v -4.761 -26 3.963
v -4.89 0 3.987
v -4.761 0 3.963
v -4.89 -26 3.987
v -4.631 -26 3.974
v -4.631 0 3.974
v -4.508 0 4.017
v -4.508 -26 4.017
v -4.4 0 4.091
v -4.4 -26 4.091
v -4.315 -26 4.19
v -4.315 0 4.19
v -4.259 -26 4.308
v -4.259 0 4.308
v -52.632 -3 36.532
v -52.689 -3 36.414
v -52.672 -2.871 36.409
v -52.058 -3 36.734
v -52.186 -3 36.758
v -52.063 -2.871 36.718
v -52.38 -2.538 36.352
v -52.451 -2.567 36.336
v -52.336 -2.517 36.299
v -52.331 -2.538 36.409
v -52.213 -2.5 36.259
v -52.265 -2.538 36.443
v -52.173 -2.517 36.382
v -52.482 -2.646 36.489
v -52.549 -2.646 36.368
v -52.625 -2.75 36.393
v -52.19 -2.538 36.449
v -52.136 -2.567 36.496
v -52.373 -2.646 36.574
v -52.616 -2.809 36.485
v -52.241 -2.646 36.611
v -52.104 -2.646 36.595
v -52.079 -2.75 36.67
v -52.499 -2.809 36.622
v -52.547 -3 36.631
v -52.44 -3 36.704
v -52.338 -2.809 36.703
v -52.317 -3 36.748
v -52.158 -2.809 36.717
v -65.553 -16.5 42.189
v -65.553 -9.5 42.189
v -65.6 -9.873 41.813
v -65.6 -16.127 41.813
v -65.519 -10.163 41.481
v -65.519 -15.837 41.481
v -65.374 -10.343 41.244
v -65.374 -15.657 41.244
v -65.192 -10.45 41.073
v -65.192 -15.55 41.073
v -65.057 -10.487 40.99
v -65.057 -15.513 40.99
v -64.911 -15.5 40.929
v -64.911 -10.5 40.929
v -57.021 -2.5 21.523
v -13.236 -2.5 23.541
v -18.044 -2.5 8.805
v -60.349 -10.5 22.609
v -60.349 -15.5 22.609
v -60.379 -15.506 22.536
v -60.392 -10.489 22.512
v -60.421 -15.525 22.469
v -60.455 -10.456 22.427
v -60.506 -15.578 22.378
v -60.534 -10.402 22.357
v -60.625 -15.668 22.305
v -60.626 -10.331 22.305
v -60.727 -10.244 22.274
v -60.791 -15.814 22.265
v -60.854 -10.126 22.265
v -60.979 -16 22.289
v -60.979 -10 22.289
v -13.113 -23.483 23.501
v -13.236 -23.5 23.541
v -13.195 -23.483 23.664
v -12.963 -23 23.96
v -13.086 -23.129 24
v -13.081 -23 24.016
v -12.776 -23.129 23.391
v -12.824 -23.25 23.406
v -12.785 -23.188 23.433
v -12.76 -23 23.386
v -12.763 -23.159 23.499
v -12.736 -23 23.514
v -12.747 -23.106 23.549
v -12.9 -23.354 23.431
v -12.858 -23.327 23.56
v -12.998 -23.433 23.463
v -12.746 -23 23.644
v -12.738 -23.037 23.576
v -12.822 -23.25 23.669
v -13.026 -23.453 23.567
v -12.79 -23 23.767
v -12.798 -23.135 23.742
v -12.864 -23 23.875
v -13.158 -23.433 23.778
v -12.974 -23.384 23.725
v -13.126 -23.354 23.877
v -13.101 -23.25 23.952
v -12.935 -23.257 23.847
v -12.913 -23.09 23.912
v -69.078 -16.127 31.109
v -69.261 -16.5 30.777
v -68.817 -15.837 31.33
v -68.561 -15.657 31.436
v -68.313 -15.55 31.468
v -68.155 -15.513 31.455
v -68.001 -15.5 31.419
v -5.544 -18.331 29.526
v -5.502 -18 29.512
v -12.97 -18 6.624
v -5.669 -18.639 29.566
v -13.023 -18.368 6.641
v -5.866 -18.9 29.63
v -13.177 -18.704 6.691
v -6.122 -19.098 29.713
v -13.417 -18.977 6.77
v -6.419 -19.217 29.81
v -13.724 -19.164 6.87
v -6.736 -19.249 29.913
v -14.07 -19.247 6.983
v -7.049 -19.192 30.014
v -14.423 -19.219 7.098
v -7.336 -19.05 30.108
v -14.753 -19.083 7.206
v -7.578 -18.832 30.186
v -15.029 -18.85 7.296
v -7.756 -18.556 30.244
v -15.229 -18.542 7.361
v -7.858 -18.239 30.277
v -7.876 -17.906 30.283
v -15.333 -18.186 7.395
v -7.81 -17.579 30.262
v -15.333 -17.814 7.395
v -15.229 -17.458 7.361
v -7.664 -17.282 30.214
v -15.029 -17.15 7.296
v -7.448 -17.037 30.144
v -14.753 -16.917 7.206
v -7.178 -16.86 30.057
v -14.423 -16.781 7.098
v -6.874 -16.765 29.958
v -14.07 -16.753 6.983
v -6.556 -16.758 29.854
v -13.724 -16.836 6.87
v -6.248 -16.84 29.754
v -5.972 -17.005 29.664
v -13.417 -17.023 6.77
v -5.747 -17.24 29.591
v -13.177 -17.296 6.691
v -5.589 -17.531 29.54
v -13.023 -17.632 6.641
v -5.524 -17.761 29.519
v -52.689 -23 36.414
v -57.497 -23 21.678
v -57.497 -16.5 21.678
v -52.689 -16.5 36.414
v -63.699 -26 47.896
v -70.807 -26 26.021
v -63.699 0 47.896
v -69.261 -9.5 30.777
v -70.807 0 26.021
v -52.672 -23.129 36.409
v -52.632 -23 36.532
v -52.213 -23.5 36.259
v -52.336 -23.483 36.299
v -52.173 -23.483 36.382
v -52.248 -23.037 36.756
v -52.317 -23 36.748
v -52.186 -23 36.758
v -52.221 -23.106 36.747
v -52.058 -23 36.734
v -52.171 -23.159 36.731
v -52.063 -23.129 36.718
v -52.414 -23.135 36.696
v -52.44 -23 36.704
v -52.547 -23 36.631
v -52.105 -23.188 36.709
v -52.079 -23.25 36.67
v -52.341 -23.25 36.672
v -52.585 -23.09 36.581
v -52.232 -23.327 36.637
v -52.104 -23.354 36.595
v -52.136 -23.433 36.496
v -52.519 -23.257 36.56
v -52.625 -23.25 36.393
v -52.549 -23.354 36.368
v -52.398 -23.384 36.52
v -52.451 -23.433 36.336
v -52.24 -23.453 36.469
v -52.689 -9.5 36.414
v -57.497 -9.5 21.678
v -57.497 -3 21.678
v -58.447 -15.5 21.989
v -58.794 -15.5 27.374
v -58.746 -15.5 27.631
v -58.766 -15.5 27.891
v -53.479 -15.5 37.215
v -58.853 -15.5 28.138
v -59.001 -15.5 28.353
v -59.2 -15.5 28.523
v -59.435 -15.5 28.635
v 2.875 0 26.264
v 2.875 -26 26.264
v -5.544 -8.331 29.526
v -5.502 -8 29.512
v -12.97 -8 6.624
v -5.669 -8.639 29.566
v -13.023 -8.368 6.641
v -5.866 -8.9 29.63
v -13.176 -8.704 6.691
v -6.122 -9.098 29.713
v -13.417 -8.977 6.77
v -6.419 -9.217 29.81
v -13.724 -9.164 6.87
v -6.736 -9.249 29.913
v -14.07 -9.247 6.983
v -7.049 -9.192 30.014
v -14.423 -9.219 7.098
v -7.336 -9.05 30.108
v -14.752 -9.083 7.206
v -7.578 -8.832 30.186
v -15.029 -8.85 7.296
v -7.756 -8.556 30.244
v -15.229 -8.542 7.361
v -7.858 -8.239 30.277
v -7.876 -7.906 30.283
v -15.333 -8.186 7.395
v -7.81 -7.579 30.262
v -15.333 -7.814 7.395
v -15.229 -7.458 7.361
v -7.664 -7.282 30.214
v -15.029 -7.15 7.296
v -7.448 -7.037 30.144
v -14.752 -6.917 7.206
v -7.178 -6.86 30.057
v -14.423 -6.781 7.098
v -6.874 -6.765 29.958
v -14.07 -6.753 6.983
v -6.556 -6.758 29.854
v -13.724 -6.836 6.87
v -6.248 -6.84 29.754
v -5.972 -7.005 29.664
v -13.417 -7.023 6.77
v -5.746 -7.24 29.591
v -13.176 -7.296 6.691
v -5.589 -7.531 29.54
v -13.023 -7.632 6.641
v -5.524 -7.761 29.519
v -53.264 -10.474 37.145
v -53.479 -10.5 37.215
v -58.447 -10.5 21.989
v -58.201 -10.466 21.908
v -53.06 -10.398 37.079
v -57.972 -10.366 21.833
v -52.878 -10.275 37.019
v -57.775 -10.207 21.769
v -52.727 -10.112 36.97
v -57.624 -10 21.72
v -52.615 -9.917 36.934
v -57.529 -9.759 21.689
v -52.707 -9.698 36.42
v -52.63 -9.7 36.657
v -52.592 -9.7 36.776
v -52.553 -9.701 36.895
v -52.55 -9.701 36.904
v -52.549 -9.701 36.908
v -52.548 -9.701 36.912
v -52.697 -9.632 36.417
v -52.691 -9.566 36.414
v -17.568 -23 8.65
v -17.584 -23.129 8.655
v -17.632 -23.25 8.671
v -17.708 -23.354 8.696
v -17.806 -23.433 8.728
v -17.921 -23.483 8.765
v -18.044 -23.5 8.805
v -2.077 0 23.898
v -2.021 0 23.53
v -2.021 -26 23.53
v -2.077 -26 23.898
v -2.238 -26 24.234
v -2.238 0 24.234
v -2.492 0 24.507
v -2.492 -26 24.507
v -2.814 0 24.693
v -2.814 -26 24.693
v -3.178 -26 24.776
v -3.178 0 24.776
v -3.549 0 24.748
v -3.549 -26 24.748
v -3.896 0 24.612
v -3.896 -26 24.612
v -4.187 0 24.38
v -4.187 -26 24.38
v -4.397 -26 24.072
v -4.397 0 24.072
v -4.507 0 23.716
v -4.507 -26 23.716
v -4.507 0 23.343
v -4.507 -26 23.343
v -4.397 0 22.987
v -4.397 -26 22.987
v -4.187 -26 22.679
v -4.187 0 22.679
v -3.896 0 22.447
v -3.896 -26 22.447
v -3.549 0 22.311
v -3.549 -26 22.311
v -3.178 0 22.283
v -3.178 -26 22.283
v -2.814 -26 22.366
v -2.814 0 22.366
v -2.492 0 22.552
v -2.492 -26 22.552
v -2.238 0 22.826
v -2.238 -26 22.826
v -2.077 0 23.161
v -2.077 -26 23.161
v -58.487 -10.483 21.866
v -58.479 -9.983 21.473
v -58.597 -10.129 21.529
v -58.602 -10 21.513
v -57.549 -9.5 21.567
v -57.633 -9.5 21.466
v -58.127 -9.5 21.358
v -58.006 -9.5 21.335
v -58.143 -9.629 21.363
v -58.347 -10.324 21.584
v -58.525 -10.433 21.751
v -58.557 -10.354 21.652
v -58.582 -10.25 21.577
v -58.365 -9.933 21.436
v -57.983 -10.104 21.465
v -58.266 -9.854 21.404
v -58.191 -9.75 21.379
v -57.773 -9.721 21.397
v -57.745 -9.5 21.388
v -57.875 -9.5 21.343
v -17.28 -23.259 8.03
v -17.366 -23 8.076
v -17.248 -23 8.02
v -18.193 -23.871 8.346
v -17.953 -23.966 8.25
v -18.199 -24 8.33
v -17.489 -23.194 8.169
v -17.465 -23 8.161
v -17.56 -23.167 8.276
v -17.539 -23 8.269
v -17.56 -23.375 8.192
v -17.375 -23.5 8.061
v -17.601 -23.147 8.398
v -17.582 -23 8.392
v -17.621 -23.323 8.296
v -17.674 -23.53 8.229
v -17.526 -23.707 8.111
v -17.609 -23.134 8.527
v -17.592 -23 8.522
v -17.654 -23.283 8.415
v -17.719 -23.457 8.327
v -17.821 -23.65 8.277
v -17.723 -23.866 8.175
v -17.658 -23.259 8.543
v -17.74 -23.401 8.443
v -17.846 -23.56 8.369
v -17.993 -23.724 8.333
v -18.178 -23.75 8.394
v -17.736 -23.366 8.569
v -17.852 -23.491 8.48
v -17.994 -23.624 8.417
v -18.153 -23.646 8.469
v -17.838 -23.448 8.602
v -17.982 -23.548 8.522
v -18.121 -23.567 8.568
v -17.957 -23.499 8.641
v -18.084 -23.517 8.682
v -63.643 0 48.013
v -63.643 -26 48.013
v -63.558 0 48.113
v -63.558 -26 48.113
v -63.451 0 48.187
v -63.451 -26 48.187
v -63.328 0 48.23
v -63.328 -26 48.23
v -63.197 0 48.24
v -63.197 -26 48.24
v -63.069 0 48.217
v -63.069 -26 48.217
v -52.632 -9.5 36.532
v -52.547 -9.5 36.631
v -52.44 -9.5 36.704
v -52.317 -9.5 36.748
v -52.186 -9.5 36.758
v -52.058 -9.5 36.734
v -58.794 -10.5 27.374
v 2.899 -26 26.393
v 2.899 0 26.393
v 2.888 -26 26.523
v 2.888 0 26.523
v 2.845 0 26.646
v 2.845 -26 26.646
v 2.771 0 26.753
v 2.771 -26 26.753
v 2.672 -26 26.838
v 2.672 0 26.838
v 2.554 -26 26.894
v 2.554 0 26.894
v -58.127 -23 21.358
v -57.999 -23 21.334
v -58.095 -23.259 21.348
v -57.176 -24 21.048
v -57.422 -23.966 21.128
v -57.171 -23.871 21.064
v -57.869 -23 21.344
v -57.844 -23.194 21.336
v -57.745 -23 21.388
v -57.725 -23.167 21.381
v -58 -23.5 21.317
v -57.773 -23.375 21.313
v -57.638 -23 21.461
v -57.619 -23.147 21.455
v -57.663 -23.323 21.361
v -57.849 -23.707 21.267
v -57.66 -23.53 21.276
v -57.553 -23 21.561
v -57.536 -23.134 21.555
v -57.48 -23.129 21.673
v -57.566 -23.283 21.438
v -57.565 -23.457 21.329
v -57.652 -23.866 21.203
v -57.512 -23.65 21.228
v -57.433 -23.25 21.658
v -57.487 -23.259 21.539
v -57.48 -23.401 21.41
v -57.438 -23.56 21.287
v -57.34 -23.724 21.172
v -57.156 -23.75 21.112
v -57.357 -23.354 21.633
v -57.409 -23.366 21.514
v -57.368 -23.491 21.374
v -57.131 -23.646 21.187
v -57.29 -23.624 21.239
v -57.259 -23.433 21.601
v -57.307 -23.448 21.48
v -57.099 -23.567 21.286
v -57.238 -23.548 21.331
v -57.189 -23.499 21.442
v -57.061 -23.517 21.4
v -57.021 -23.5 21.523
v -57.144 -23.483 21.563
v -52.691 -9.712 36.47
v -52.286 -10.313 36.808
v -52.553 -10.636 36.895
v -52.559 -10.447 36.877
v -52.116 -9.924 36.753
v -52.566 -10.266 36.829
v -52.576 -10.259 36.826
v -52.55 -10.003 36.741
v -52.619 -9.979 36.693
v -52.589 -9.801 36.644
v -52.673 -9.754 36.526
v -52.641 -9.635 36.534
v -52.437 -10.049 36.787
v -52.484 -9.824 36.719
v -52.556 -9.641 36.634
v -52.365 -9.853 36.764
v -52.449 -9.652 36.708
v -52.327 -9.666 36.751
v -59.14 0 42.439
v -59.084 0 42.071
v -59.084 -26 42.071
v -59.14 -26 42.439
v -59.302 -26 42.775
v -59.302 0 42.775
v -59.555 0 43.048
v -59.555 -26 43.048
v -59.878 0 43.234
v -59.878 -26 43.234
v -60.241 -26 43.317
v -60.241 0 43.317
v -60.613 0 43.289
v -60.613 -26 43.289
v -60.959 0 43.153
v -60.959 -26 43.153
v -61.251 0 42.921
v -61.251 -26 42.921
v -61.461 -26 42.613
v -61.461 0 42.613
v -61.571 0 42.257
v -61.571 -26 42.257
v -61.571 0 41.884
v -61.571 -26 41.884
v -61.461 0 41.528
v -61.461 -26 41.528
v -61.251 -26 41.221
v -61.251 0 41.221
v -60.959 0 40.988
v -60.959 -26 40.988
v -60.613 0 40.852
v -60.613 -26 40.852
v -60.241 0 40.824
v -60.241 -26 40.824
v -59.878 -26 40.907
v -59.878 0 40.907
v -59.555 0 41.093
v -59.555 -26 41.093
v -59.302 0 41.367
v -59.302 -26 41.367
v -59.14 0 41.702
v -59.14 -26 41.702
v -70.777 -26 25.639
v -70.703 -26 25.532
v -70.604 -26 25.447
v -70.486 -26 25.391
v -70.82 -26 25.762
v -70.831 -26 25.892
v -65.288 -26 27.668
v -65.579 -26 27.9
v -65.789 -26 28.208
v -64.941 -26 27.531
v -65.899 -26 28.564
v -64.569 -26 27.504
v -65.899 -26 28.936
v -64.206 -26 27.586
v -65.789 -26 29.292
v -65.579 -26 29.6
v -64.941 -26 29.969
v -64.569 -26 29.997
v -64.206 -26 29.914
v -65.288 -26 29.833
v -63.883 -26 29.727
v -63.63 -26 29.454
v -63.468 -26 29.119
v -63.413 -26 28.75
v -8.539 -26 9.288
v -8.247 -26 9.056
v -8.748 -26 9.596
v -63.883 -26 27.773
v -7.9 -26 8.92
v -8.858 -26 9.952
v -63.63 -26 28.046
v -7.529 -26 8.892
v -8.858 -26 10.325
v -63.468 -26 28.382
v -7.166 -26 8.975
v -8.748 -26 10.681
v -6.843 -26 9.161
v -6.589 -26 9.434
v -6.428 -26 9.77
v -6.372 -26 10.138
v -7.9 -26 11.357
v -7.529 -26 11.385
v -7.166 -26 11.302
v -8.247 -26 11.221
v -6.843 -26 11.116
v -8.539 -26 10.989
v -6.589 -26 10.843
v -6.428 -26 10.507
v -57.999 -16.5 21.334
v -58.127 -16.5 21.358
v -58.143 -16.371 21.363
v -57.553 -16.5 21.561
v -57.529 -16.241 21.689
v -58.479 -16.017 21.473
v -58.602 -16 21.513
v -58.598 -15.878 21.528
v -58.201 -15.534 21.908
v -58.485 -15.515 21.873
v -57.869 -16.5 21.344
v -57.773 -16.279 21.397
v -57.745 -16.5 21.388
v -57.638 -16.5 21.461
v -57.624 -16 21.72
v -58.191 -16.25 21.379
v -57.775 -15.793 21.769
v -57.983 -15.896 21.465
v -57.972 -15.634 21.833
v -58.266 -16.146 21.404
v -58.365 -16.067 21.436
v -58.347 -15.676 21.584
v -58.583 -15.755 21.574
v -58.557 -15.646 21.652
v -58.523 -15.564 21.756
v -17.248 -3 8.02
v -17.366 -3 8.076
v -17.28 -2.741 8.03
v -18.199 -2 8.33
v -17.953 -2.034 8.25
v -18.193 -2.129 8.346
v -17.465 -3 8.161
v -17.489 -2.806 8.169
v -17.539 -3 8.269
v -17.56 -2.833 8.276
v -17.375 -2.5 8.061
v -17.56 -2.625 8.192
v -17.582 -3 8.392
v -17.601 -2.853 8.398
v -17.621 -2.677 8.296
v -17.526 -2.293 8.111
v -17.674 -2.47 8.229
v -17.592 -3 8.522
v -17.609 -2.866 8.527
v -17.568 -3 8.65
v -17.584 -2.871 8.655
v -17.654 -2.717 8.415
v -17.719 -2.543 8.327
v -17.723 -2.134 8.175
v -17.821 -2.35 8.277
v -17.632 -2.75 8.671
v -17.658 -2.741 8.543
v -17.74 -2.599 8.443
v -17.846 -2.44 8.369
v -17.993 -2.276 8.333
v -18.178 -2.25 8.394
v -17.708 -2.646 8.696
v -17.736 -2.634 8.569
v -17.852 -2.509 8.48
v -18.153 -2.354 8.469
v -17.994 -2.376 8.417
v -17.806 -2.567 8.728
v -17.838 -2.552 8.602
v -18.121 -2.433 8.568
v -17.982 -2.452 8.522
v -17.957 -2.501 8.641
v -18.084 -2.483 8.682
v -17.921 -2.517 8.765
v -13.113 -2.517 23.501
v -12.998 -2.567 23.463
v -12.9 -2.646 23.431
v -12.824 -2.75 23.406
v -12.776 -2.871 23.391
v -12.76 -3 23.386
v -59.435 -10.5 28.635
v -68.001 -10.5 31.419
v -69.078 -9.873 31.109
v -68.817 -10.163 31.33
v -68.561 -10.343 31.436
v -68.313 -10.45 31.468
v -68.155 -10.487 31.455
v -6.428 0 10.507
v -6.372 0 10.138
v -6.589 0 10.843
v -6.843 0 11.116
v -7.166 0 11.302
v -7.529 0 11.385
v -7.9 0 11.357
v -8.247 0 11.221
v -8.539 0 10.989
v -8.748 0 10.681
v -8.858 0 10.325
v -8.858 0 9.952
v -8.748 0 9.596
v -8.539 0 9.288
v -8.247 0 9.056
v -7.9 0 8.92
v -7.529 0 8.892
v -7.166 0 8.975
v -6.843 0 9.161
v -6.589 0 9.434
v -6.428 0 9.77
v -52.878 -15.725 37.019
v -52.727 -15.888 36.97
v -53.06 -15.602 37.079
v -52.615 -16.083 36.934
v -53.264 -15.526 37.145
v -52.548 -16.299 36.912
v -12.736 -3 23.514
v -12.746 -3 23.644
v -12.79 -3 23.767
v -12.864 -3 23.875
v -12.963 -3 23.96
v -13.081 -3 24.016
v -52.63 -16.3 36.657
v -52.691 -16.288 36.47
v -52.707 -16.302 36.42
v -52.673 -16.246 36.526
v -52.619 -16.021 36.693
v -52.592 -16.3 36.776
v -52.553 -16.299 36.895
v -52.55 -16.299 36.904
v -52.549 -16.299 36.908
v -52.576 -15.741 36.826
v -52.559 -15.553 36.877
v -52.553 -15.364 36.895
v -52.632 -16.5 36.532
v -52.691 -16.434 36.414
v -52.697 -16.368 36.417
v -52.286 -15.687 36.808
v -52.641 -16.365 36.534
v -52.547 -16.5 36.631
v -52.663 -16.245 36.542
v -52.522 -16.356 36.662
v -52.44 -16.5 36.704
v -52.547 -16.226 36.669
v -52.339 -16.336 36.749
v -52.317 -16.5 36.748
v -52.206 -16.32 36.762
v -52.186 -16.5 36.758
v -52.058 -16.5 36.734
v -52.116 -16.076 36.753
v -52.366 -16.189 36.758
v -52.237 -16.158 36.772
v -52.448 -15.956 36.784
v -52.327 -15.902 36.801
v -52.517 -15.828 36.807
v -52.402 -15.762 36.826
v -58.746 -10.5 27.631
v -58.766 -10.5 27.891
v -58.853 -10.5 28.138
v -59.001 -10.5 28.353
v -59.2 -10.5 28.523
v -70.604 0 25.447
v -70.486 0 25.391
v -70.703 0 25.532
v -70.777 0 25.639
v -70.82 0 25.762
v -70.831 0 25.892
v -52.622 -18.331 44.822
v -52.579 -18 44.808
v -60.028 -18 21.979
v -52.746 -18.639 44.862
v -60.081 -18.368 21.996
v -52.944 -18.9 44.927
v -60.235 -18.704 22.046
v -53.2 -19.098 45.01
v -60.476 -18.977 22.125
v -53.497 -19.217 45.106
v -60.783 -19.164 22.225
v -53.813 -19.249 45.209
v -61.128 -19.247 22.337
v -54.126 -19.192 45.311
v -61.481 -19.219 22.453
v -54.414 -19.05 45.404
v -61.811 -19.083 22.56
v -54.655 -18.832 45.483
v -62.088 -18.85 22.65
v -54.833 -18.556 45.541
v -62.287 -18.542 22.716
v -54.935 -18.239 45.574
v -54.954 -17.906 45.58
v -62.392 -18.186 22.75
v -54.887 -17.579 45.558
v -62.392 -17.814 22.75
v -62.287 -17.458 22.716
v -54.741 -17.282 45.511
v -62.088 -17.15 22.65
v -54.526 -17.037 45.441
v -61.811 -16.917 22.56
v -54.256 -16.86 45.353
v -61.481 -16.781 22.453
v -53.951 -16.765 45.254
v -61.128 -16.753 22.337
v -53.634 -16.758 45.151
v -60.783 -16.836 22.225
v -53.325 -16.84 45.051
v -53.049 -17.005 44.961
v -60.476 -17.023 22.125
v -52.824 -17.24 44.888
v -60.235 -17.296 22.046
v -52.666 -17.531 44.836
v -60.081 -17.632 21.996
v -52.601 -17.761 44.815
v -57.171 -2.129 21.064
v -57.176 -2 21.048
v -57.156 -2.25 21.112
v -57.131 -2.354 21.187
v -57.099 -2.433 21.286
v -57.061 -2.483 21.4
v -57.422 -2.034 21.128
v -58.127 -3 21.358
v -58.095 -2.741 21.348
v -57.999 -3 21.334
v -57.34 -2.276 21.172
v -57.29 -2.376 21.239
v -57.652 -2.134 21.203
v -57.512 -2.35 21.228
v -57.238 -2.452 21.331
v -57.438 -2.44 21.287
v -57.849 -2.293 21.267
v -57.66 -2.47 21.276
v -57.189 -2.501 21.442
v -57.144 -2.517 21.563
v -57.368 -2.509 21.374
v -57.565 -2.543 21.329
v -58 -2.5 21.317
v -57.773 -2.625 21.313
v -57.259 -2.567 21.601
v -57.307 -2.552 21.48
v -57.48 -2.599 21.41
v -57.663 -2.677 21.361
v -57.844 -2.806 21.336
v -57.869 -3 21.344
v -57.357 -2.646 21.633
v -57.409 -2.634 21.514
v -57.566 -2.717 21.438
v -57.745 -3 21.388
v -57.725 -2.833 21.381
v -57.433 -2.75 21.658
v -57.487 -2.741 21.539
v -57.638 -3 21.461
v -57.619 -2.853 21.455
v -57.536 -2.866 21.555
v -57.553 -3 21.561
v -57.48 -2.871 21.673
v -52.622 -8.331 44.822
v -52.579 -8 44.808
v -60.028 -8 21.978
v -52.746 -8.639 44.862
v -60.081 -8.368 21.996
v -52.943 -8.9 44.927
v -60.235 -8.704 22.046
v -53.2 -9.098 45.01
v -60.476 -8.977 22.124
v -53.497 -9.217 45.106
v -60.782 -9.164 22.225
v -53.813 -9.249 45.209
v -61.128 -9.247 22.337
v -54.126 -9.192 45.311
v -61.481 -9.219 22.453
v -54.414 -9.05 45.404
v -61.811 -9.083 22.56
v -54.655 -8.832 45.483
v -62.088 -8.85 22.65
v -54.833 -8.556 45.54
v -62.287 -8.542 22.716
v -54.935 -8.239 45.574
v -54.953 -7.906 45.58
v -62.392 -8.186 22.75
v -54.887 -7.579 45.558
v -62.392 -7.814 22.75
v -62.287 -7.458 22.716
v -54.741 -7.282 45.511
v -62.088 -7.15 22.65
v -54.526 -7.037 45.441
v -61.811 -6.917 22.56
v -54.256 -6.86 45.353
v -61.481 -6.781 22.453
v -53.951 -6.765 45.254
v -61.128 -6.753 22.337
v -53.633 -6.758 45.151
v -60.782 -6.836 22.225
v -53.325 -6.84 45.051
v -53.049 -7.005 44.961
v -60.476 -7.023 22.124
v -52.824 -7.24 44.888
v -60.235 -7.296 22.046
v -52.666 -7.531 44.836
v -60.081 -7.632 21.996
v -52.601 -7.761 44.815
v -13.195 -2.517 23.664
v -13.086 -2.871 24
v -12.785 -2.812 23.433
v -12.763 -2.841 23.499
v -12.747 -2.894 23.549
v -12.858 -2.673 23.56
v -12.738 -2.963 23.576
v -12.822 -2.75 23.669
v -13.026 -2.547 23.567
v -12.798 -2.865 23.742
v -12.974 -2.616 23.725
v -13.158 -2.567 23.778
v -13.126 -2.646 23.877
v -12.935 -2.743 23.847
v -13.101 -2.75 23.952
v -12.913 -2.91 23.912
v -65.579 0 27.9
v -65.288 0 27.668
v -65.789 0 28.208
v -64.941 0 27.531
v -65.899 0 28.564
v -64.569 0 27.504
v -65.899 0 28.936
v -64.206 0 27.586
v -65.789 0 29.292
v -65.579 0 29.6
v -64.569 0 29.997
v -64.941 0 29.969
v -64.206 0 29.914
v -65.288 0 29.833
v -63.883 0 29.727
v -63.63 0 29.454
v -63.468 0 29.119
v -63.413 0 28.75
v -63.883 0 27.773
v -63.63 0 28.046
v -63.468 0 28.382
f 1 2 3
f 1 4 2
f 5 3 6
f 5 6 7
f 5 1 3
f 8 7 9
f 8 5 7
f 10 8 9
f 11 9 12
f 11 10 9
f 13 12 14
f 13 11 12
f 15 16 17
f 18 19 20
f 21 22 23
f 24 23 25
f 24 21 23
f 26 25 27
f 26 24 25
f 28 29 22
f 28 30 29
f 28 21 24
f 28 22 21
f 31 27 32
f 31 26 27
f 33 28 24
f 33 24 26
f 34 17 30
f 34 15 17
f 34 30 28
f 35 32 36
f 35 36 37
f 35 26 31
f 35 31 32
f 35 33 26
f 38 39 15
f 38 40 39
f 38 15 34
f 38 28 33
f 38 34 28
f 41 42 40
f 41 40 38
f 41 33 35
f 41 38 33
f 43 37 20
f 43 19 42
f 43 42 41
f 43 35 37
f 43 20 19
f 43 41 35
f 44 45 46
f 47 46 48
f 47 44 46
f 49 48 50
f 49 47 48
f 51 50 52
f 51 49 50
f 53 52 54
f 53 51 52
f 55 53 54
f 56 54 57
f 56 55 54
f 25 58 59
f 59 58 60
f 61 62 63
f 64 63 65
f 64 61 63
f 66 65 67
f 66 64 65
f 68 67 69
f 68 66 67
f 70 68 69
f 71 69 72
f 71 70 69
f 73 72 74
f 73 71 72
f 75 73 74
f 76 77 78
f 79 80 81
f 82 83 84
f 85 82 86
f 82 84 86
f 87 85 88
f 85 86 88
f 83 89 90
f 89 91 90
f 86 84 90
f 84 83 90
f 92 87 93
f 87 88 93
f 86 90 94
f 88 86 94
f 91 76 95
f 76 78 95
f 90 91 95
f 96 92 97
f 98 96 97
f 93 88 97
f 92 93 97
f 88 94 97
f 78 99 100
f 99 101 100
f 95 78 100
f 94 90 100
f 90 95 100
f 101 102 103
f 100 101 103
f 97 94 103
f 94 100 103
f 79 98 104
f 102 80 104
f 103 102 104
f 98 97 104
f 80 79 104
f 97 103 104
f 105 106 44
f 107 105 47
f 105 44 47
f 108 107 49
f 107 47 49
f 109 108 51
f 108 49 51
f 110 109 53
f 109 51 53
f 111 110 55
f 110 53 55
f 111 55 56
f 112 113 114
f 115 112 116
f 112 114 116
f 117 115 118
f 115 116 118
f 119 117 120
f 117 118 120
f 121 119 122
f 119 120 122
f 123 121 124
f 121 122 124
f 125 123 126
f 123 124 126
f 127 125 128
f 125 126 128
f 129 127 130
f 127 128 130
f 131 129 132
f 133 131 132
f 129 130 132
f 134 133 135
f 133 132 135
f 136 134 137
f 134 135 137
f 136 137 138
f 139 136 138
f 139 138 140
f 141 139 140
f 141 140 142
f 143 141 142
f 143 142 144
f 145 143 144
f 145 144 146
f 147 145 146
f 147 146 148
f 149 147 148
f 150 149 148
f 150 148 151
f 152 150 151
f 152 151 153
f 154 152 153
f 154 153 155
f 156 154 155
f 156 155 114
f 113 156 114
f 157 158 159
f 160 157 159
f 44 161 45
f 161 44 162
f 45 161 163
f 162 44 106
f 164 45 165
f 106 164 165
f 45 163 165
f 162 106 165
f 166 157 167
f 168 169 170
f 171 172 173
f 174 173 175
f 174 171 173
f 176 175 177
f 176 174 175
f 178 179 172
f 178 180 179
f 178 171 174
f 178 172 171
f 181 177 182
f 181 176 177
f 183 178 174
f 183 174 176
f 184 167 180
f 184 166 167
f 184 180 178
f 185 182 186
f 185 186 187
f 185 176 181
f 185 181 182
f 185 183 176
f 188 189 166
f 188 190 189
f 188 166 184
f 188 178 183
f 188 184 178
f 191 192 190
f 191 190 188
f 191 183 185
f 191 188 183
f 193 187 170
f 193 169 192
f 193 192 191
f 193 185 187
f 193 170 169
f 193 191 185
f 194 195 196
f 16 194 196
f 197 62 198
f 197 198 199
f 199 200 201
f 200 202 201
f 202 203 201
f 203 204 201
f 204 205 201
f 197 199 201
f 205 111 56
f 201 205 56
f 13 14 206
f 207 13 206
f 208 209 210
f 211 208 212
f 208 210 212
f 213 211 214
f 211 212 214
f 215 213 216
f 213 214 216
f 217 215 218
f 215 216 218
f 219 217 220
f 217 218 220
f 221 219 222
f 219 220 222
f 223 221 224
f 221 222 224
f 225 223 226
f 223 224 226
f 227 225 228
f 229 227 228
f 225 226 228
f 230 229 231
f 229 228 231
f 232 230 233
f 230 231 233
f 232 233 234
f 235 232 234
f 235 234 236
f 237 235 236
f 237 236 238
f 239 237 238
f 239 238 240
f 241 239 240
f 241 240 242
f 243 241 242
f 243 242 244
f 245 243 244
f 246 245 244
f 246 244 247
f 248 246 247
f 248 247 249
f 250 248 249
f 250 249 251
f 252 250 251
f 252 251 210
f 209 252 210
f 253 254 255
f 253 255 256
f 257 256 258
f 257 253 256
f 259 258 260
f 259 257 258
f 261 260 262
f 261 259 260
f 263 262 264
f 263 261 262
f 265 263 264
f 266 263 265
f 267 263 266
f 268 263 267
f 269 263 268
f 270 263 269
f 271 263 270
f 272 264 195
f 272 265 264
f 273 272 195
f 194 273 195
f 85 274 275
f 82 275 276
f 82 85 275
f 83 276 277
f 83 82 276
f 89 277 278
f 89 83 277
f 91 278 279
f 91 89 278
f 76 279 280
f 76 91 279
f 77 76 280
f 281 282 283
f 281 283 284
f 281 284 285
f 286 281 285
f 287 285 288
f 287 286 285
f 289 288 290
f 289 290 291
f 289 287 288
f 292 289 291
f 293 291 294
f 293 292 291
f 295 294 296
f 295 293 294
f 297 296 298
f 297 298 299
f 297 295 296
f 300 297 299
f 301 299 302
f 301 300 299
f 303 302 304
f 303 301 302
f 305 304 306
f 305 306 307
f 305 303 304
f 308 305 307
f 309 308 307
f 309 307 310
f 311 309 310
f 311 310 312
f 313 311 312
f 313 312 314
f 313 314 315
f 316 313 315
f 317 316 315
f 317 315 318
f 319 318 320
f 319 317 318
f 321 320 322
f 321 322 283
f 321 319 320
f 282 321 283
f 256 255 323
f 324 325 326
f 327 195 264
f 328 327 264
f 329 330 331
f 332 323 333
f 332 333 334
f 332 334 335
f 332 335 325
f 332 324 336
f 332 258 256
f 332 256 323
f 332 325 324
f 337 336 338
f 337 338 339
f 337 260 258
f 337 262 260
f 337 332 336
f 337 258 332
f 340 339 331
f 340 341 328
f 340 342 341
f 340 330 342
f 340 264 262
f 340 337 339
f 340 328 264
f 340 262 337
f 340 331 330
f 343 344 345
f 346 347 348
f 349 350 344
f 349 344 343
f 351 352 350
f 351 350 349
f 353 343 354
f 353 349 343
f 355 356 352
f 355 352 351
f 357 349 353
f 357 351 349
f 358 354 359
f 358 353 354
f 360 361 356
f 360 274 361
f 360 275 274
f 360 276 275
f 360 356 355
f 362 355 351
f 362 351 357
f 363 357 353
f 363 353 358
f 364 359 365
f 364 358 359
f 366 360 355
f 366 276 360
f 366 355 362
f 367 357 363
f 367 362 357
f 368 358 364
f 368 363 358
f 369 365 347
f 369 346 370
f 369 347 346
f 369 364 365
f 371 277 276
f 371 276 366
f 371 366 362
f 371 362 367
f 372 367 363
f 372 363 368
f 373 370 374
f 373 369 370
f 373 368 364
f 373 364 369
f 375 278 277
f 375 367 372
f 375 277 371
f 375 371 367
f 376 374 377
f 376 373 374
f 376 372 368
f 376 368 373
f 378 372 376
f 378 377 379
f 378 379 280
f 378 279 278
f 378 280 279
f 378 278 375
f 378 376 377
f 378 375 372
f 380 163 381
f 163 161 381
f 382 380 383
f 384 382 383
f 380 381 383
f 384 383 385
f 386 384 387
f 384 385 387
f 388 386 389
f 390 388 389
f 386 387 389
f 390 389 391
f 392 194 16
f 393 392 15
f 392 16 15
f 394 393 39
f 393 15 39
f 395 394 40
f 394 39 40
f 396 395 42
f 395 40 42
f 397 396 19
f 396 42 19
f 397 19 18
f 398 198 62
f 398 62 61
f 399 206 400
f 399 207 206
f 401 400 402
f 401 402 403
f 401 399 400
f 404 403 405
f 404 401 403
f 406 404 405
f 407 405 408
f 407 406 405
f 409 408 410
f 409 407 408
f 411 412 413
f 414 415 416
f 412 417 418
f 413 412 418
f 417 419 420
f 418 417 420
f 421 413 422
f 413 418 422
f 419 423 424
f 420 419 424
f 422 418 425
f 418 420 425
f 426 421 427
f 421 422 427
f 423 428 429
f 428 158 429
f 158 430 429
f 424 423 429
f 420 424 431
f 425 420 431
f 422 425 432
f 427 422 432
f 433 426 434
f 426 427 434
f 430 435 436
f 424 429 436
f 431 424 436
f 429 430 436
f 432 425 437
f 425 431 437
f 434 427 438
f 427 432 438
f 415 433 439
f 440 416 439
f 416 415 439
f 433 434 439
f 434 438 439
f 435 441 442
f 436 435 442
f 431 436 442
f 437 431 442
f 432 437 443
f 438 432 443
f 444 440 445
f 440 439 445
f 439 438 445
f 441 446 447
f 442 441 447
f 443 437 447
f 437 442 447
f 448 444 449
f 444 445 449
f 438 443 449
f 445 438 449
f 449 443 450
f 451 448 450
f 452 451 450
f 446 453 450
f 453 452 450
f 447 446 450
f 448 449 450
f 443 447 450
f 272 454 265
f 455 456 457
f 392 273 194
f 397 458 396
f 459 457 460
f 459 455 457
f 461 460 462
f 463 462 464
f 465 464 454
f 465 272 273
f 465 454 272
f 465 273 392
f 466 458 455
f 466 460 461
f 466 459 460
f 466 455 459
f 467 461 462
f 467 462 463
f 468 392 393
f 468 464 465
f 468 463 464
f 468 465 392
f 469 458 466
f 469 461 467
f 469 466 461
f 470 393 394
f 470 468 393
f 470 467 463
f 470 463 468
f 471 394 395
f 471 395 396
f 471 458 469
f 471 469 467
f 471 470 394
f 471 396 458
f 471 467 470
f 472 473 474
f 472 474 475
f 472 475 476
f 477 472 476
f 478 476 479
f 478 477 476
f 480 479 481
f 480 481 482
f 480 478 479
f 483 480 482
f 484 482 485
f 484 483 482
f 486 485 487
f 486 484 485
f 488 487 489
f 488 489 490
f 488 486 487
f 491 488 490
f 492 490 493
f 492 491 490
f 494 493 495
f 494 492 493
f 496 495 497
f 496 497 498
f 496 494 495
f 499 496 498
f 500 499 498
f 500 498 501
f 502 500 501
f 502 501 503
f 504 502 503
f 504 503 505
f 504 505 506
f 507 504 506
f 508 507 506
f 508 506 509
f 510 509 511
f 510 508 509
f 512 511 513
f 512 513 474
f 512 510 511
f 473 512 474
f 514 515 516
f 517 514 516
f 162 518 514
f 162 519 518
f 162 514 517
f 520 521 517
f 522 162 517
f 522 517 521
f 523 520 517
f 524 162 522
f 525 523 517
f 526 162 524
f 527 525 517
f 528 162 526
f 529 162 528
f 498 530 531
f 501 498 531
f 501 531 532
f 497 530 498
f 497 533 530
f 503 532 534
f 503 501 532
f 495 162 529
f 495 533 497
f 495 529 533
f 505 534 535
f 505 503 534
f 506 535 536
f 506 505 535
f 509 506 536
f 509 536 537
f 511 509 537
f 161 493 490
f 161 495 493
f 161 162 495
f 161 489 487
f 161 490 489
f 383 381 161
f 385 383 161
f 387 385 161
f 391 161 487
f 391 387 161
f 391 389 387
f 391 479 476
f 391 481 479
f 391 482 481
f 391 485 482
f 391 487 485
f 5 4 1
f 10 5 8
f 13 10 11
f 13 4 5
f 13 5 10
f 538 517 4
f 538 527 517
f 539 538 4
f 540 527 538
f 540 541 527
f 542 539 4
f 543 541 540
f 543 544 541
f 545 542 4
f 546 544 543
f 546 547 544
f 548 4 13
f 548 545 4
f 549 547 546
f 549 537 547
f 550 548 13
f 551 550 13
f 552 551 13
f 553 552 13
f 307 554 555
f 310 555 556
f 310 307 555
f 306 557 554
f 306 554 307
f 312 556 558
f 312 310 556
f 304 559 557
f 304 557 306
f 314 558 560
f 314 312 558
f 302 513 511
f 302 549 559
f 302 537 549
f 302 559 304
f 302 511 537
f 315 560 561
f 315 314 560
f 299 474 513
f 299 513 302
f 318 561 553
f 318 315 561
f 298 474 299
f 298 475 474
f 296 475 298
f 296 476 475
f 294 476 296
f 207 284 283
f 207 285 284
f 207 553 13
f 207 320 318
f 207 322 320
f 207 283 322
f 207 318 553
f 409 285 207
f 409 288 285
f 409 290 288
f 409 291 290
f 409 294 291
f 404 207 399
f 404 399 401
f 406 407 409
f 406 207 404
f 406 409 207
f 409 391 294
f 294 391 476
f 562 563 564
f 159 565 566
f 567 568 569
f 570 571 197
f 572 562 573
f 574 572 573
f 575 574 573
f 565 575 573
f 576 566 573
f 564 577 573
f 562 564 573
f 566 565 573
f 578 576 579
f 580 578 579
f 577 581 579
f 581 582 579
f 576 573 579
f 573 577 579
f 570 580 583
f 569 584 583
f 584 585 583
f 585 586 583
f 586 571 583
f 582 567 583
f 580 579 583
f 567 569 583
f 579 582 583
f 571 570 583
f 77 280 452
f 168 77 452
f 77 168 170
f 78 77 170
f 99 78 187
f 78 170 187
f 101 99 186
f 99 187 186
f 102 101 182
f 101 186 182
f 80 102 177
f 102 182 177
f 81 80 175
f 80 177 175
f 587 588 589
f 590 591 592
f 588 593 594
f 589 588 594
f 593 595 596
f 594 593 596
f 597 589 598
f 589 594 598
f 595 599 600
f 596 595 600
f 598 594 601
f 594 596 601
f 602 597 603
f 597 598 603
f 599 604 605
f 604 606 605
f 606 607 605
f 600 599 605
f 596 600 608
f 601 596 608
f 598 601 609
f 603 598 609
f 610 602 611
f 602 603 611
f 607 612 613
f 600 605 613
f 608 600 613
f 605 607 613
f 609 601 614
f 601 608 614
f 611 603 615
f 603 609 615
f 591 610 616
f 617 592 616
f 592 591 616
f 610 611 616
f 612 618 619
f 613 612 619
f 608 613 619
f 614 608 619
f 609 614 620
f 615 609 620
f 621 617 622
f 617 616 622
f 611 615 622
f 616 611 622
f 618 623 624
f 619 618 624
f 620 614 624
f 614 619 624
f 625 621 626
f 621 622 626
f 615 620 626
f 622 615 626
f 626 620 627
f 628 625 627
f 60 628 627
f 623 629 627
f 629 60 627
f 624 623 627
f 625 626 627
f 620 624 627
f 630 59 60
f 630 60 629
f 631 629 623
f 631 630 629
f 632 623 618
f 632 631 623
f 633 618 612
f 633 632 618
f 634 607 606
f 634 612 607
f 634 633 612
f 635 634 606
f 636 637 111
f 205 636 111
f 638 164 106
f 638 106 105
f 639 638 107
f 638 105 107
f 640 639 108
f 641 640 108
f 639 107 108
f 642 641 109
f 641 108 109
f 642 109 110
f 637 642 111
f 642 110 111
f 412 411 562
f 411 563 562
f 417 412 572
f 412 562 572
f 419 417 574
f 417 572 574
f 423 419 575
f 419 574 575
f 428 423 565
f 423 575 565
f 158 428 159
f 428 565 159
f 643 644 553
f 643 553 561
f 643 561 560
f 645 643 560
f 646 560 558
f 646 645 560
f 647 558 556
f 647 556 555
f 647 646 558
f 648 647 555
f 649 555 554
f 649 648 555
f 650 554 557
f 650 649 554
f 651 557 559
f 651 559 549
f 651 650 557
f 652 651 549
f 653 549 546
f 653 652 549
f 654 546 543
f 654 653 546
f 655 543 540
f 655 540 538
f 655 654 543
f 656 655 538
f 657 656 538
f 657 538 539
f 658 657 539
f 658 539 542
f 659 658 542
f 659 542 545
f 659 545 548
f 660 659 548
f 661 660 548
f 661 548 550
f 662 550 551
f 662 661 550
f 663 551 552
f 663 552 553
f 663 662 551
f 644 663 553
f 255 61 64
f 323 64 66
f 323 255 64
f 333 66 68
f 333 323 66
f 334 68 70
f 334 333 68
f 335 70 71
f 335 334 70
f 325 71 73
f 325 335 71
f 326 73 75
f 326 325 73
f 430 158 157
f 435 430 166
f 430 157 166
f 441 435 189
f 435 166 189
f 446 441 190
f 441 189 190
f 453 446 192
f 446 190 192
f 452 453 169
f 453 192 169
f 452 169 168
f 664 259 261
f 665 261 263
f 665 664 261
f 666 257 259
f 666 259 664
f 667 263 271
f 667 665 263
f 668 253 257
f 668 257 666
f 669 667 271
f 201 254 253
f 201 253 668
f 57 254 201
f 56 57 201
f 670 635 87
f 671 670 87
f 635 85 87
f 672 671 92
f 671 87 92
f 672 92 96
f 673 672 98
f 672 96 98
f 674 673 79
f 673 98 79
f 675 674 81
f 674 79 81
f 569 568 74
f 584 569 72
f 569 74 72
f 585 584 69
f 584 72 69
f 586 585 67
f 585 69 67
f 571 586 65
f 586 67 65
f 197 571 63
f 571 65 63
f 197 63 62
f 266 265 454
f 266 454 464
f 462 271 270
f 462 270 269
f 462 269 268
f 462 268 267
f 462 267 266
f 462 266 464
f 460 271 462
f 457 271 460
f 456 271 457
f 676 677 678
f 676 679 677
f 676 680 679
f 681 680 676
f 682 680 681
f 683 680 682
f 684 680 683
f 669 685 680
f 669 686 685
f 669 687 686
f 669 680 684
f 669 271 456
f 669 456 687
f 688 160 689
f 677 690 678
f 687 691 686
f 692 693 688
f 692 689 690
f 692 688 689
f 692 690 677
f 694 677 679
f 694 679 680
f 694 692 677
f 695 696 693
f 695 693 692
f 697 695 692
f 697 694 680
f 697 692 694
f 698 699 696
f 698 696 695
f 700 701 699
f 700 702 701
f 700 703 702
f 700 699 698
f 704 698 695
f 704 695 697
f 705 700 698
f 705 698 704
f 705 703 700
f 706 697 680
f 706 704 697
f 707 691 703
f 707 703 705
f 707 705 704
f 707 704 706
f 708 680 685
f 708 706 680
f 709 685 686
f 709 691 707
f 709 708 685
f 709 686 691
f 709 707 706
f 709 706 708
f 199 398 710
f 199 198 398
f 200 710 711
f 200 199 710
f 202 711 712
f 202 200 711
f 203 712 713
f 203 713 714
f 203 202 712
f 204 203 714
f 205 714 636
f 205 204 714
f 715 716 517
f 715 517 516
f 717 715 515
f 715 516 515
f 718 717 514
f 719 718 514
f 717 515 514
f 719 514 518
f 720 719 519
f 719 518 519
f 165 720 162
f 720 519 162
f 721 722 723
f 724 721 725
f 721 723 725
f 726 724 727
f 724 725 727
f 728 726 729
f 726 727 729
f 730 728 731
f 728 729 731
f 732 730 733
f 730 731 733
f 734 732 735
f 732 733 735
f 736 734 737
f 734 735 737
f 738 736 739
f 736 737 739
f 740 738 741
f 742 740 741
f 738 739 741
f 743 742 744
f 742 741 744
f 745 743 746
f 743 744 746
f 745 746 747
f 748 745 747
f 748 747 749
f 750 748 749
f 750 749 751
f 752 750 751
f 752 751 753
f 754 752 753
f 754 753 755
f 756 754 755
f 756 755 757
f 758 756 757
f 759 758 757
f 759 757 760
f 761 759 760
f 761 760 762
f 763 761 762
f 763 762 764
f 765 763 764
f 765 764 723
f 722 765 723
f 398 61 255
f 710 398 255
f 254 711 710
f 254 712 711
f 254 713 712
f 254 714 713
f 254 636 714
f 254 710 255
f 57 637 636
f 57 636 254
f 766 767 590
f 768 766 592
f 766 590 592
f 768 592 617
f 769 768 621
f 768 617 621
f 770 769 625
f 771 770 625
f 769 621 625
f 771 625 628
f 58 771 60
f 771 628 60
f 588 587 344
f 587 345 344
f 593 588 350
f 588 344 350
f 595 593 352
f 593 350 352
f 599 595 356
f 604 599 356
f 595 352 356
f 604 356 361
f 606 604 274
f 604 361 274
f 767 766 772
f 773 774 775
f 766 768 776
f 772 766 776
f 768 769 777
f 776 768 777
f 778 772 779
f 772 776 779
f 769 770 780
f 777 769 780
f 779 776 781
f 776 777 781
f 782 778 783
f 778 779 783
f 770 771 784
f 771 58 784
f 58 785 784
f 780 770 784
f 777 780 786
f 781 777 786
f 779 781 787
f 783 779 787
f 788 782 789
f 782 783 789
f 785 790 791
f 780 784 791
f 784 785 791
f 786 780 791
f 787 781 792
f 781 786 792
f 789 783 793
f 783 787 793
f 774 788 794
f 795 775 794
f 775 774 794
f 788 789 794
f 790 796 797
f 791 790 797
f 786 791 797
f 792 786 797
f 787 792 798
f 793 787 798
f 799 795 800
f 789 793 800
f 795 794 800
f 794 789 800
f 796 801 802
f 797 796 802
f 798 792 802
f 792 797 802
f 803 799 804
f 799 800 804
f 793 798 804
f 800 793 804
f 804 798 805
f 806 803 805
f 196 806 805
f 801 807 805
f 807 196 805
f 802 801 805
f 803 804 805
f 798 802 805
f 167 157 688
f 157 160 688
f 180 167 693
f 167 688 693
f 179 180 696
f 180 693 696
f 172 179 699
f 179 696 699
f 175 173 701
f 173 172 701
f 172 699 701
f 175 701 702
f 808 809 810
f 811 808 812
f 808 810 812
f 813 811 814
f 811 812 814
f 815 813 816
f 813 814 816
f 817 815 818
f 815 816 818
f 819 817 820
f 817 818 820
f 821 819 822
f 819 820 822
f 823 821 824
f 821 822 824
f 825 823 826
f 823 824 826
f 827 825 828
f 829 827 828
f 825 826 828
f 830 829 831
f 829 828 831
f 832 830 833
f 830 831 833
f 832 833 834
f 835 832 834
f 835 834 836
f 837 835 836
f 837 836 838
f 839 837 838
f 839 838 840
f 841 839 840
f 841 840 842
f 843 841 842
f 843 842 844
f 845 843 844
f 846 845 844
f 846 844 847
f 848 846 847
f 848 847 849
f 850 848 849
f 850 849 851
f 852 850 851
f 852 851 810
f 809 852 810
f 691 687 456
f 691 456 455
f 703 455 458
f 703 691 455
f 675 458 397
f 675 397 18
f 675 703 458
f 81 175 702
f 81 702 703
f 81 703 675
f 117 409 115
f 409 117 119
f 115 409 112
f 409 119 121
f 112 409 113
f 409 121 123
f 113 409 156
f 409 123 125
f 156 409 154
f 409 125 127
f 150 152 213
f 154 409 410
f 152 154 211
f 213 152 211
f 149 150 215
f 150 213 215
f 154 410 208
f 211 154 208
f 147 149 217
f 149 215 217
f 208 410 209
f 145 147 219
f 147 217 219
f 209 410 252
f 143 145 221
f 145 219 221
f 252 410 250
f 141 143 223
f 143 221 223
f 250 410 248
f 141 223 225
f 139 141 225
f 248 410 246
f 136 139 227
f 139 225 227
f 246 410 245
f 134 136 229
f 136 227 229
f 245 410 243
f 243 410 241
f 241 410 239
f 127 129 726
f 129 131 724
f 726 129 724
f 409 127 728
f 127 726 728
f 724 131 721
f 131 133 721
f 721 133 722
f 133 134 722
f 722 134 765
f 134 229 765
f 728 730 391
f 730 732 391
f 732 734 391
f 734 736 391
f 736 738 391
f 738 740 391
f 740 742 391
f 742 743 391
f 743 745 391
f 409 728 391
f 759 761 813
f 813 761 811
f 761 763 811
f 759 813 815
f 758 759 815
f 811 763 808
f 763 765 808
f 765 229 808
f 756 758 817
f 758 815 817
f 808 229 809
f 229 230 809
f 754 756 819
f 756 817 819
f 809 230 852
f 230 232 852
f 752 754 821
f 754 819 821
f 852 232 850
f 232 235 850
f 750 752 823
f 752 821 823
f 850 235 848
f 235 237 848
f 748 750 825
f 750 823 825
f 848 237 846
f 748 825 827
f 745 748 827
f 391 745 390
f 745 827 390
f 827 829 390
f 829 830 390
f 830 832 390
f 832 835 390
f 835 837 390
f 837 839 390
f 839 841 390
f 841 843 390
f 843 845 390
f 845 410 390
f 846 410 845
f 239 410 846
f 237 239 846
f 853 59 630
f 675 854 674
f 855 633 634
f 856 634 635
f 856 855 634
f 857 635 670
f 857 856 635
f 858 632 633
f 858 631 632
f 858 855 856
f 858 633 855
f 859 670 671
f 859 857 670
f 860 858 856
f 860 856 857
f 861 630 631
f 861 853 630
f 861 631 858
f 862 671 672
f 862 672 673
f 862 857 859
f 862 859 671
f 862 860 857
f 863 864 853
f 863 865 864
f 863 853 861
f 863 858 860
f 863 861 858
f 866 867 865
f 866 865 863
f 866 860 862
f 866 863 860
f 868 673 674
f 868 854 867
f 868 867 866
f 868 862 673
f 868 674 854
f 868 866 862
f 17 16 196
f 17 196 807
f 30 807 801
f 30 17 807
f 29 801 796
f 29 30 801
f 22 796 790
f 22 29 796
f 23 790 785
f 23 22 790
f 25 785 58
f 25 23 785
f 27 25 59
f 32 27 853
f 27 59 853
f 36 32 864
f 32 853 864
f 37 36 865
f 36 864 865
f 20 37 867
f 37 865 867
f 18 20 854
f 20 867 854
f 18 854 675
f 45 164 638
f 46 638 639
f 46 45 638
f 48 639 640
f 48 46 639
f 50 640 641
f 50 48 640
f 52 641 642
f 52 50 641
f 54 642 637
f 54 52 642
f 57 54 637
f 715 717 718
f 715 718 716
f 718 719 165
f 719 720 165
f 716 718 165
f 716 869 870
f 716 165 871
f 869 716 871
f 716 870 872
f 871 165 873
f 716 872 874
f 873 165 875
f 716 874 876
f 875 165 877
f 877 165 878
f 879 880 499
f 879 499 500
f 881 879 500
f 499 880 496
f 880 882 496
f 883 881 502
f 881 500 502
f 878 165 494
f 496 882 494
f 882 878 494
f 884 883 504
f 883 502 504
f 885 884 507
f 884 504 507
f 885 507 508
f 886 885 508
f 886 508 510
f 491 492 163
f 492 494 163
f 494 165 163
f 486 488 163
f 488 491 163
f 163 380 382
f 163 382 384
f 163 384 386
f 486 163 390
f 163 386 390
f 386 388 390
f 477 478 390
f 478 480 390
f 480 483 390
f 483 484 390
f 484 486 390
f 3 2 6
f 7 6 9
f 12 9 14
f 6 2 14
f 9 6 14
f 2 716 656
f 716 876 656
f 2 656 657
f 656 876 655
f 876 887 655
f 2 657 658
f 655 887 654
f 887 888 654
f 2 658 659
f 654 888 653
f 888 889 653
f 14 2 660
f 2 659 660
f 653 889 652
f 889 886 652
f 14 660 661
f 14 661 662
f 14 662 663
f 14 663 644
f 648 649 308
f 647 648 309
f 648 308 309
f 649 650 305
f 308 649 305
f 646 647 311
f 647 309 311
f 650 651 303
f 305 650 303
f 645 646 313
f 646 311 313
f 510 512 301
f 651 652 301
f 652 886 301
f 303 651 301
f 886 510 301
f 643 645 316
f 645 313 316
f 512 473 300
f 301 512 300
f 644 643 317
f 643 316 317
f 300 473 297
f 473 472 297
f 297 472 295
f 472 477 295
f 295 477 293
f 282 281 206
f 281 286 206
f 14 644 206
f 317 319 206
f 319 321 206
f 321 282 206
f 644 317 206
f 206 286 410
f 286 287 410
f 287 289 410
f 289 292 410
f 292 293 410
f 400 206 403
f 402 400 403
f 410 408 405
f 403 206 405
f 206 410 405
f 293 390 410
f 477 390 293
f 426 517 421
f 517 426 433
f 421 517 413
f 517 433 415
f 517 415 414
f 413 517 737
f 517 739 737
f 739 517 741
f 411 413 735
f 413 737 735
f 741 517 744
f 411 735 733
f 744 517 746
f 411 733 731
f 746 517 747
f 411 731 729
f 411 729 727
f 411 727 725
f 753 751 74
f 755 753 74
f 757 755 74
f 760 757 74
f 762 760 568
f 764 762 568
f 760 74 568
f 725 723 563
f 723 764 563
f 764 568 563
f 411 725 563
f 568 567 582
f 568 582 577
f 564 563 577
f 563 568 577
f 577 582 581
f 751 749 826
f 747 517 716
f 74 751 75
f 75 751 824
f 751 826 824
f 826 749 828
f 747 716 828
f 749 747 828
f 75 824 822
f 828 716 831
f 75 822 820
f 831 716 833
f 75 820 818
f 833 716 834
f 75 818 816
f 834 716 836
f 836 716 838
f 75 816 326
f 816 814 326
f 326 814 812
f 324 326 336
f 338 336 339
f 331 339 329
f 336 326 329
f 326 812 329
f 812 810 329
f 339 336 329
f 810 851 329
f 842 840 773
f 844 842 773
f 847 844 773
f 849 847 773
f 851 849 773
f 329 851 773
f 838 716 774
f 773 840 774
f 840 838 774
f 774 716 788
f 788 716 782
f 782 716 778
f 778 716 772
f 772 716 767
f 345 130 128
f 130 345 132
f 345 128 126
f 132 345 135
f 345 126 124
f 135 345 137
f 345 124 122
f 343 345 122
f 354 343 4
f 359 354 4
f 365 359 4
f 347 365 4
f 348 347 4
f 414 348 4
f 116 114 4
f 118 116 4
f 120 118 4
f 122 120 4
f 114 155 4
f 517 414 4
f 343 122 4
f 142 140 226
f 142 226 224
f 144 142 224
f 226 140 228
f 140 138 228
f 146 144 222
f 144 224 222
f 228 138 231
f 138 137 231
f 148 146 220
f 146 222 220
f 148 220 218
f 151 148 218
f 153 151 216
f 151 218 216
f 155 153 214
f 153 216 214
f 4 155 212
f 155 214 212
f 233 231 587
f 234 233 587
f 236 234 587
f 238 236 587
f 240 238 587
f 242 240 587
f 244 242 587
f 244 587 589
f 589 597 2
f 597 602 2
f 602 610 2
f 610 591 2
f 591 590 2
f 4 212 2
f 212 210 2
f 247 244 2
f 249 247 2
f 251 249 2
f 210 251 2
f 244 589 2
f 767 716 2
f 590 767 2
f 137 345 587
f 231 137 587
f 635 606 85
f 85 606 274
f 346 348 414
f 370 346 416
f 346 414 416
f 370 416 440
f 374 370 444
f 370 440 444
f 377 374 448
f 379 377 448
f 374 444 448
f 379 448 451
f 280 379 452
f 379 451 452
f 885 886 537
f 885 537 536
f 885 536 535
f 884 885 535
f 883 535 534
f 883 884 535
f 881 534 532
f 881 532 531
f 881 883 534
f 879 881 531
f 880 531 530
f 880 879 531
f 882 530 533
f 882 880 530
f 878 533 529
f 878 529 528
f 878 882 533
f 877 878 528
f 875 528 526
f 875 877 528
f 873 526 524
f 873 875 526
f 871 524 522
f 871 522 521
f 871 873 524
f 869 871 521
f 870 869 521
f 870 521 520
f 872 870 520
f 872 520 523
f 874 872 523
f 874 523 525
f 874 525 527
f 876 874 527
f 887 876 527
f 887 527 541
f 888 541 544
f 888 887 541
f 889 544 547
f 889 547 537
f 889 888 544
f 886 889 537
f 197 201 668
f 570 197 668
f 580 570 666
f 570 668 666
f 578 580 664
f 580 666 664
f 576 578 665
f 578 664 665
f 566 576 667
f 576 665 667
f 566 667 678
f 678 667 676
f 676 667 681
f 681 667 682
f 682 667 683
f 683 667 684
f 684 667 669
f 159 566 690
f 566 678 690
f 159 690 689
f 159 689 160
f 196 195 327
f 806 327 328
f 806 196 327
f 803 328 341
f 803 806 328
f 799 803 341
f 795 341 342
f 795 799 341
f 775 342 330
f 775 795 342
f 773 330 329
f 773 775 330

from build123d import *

# Parameters (mm, degrees)
F0_R     = 1.25
F1_DEPTH = 26
F2_R     = 1.25
F3_DEPTH = 25
F4_DEPTH = 16.5
F5_W     = 5
F5_H     = 10
F6_DEPTH = 14
F7_R     = 1
F8_R     = 0.5


with BuildPart() as f1:
    # F0 (on Front) → F1 (new body)
    with BuildSketch(Plane.XZ):
        Polygon((-63.544681223, 48.3711008589), (-70.961089088, 25.5457444679), (-4.4139098395, 3.8321440613), (3.0292749177, 26.7399112527), align=None)
        with Locations((-7.6221936302, 10.1384017438)):
            Circle(F0_R, mode=Mode.SUBTRACT)
        with Locations((-3.2710926357, 23.5297136431)):
            Circle(F0_R, mode=Mode.SUBTRACT)
        with Locations((-64.662632986, 28.7500592351)):
            Circle(F0_R, mode=Mode.SUBTRACT)
        with Locations((-60.3344836134, 42.0707333056)):
            Circle(F0_R, mode=Mode.SUBTRACT)
    extrude(amount=F1_DEPTH)

    # F2 (on face) → F3 (cut)
    with BuildSketch(Plane(origin=(0.7053652428, 0, 2.1617818497), x_dir=(0.9506732609, 0, -0.3101940539), z_dir=(-0.3101940539, 0, -0.9506732609))):
        with Locations((-65.1349479941, 18)):
            Circle(F2_R)
        with Locations((-65.1348943617, 8)):
            Circle(F2_R)
        with Locations((-15.6349479941, 18)):
            Circle(F2_R)
        with Locations((-15.6348943617, 8)):
            Circle(F2_R)
    extrude(amount=-F3_DEPTH, mode=Mode.SUBTRACT)

    # F2 (on face) → F4 (cut)
    with BuildSketch(Plane(origin=(0.7053652428, 0, 2.1617818497), x_dir=(0.9506732609, 0, -0.3101940539), z_dir=(-0.3101940539, 0, -0.9506732609))):
        Polygon((-19.3849479941, 23.5), (-61.3849479941, 23.5), (-61.3849479941, 15.5), (-64.3849479941, 15.5), (-64.3849479941, 10.5), (-61.3849479941, 10.5), (-61.3849479941, 2.5), (-19.3849479941, 2.5), align=None)
    extrude(amount=-F4_DEPTH, mode=Mode.SUBTRACT)

    # F5 (on face) → F6 (cut)
    with BuildSketch(Plane(origin=(-71.6926139783, 0, 23.294342356), x_dir=(0, -1, 0), z_dir=(-0.9510565163, 0, 0.3090169944))):
        with Locations((13, 13.8672642722)):
            Rectangle(F5_W, F5_H)
    extrude(amount=-F6_DEPTH, mode=Mode.SUBTRACT)

    # F7 (call 1 of 4: OpenCascade refuses the feature's edges together)
    f7_edges = [f1.edges().sort_by_distance(p)[0] for p in [
        (-67.407394, -10.5, 36.482894),
        (-67.407394, -15.5, 36.482894),
        (-65.862309, -13, 41.238177),
        (-68.952479, -13, 31.727612),
    ]]
    fillet(f7_edges, radius=F7_R)

    # F7#2 (call 2 of 4)
    f7_2_edges = [f1.edges().sort_by_distance(p)[0] for p in [
        (-55.092562, -15.5, 29.046082),
    ]]
    fillet(f7_2_edges, radius=F7_R)

    # F7#3 (call 3 of 4)
    f7_3_edges = [f1.edges().sort_by_distance(p)[0] for p in [
        (-55.092562, -10.5, 29.046082),
    ]]
    fillet(f7_3_edges, radius=F7_R)

    # F7#4 (call 4 of 4)
    f7_4_edges = [f1.edges().sort_by_distance(p)[0] for p in [
        (-58.483196, -13, 28.325936),
    ]]
    fillet(f7_4_edges, radius=F7_R)

    # F8
    f8_edges = [f1.edges().sort_by_distance(p)[0] for p in [
        (-57.651663, -20, 21.203028),
        (-60.503683, -13, 22.13361),
        (-59.55301, -10.5, 21.823416),
        (-57.930109, -10.207107, 21.293881),
        (-37.687525, -23.5, 14.688953),
        (-55.092562, -23.5, 29.046082),
        (-52.533462, -20, 36.889137),
        (-32.569323, -23.5, 30.375061),
        (-52.533462, -6, 36.889137),
        (-55.092562, -2.5, 29.046082),
        (-32.569323, -2.5, 30.375061),
        (-37.687525, -2.5, 14.688953),
        (-15.164286, -2.5, 16.017932),
        (-15.164286, -23.5, 16.017932),
        (-17.723386, -13, 8.174877),
        (-12.605185, -13, 23.860986),
        (-57.651663, -6, 21.203028),
        (-70.961089, -13, 25.545744),
        (-4.41391, -13, 3.832144),
        (3.029275, -13, 26.739911),
        (-63.544681, -13, 48.371101),
    ]]
    fillet(f8_edges, radius=F8_R)


solid = f1.part
